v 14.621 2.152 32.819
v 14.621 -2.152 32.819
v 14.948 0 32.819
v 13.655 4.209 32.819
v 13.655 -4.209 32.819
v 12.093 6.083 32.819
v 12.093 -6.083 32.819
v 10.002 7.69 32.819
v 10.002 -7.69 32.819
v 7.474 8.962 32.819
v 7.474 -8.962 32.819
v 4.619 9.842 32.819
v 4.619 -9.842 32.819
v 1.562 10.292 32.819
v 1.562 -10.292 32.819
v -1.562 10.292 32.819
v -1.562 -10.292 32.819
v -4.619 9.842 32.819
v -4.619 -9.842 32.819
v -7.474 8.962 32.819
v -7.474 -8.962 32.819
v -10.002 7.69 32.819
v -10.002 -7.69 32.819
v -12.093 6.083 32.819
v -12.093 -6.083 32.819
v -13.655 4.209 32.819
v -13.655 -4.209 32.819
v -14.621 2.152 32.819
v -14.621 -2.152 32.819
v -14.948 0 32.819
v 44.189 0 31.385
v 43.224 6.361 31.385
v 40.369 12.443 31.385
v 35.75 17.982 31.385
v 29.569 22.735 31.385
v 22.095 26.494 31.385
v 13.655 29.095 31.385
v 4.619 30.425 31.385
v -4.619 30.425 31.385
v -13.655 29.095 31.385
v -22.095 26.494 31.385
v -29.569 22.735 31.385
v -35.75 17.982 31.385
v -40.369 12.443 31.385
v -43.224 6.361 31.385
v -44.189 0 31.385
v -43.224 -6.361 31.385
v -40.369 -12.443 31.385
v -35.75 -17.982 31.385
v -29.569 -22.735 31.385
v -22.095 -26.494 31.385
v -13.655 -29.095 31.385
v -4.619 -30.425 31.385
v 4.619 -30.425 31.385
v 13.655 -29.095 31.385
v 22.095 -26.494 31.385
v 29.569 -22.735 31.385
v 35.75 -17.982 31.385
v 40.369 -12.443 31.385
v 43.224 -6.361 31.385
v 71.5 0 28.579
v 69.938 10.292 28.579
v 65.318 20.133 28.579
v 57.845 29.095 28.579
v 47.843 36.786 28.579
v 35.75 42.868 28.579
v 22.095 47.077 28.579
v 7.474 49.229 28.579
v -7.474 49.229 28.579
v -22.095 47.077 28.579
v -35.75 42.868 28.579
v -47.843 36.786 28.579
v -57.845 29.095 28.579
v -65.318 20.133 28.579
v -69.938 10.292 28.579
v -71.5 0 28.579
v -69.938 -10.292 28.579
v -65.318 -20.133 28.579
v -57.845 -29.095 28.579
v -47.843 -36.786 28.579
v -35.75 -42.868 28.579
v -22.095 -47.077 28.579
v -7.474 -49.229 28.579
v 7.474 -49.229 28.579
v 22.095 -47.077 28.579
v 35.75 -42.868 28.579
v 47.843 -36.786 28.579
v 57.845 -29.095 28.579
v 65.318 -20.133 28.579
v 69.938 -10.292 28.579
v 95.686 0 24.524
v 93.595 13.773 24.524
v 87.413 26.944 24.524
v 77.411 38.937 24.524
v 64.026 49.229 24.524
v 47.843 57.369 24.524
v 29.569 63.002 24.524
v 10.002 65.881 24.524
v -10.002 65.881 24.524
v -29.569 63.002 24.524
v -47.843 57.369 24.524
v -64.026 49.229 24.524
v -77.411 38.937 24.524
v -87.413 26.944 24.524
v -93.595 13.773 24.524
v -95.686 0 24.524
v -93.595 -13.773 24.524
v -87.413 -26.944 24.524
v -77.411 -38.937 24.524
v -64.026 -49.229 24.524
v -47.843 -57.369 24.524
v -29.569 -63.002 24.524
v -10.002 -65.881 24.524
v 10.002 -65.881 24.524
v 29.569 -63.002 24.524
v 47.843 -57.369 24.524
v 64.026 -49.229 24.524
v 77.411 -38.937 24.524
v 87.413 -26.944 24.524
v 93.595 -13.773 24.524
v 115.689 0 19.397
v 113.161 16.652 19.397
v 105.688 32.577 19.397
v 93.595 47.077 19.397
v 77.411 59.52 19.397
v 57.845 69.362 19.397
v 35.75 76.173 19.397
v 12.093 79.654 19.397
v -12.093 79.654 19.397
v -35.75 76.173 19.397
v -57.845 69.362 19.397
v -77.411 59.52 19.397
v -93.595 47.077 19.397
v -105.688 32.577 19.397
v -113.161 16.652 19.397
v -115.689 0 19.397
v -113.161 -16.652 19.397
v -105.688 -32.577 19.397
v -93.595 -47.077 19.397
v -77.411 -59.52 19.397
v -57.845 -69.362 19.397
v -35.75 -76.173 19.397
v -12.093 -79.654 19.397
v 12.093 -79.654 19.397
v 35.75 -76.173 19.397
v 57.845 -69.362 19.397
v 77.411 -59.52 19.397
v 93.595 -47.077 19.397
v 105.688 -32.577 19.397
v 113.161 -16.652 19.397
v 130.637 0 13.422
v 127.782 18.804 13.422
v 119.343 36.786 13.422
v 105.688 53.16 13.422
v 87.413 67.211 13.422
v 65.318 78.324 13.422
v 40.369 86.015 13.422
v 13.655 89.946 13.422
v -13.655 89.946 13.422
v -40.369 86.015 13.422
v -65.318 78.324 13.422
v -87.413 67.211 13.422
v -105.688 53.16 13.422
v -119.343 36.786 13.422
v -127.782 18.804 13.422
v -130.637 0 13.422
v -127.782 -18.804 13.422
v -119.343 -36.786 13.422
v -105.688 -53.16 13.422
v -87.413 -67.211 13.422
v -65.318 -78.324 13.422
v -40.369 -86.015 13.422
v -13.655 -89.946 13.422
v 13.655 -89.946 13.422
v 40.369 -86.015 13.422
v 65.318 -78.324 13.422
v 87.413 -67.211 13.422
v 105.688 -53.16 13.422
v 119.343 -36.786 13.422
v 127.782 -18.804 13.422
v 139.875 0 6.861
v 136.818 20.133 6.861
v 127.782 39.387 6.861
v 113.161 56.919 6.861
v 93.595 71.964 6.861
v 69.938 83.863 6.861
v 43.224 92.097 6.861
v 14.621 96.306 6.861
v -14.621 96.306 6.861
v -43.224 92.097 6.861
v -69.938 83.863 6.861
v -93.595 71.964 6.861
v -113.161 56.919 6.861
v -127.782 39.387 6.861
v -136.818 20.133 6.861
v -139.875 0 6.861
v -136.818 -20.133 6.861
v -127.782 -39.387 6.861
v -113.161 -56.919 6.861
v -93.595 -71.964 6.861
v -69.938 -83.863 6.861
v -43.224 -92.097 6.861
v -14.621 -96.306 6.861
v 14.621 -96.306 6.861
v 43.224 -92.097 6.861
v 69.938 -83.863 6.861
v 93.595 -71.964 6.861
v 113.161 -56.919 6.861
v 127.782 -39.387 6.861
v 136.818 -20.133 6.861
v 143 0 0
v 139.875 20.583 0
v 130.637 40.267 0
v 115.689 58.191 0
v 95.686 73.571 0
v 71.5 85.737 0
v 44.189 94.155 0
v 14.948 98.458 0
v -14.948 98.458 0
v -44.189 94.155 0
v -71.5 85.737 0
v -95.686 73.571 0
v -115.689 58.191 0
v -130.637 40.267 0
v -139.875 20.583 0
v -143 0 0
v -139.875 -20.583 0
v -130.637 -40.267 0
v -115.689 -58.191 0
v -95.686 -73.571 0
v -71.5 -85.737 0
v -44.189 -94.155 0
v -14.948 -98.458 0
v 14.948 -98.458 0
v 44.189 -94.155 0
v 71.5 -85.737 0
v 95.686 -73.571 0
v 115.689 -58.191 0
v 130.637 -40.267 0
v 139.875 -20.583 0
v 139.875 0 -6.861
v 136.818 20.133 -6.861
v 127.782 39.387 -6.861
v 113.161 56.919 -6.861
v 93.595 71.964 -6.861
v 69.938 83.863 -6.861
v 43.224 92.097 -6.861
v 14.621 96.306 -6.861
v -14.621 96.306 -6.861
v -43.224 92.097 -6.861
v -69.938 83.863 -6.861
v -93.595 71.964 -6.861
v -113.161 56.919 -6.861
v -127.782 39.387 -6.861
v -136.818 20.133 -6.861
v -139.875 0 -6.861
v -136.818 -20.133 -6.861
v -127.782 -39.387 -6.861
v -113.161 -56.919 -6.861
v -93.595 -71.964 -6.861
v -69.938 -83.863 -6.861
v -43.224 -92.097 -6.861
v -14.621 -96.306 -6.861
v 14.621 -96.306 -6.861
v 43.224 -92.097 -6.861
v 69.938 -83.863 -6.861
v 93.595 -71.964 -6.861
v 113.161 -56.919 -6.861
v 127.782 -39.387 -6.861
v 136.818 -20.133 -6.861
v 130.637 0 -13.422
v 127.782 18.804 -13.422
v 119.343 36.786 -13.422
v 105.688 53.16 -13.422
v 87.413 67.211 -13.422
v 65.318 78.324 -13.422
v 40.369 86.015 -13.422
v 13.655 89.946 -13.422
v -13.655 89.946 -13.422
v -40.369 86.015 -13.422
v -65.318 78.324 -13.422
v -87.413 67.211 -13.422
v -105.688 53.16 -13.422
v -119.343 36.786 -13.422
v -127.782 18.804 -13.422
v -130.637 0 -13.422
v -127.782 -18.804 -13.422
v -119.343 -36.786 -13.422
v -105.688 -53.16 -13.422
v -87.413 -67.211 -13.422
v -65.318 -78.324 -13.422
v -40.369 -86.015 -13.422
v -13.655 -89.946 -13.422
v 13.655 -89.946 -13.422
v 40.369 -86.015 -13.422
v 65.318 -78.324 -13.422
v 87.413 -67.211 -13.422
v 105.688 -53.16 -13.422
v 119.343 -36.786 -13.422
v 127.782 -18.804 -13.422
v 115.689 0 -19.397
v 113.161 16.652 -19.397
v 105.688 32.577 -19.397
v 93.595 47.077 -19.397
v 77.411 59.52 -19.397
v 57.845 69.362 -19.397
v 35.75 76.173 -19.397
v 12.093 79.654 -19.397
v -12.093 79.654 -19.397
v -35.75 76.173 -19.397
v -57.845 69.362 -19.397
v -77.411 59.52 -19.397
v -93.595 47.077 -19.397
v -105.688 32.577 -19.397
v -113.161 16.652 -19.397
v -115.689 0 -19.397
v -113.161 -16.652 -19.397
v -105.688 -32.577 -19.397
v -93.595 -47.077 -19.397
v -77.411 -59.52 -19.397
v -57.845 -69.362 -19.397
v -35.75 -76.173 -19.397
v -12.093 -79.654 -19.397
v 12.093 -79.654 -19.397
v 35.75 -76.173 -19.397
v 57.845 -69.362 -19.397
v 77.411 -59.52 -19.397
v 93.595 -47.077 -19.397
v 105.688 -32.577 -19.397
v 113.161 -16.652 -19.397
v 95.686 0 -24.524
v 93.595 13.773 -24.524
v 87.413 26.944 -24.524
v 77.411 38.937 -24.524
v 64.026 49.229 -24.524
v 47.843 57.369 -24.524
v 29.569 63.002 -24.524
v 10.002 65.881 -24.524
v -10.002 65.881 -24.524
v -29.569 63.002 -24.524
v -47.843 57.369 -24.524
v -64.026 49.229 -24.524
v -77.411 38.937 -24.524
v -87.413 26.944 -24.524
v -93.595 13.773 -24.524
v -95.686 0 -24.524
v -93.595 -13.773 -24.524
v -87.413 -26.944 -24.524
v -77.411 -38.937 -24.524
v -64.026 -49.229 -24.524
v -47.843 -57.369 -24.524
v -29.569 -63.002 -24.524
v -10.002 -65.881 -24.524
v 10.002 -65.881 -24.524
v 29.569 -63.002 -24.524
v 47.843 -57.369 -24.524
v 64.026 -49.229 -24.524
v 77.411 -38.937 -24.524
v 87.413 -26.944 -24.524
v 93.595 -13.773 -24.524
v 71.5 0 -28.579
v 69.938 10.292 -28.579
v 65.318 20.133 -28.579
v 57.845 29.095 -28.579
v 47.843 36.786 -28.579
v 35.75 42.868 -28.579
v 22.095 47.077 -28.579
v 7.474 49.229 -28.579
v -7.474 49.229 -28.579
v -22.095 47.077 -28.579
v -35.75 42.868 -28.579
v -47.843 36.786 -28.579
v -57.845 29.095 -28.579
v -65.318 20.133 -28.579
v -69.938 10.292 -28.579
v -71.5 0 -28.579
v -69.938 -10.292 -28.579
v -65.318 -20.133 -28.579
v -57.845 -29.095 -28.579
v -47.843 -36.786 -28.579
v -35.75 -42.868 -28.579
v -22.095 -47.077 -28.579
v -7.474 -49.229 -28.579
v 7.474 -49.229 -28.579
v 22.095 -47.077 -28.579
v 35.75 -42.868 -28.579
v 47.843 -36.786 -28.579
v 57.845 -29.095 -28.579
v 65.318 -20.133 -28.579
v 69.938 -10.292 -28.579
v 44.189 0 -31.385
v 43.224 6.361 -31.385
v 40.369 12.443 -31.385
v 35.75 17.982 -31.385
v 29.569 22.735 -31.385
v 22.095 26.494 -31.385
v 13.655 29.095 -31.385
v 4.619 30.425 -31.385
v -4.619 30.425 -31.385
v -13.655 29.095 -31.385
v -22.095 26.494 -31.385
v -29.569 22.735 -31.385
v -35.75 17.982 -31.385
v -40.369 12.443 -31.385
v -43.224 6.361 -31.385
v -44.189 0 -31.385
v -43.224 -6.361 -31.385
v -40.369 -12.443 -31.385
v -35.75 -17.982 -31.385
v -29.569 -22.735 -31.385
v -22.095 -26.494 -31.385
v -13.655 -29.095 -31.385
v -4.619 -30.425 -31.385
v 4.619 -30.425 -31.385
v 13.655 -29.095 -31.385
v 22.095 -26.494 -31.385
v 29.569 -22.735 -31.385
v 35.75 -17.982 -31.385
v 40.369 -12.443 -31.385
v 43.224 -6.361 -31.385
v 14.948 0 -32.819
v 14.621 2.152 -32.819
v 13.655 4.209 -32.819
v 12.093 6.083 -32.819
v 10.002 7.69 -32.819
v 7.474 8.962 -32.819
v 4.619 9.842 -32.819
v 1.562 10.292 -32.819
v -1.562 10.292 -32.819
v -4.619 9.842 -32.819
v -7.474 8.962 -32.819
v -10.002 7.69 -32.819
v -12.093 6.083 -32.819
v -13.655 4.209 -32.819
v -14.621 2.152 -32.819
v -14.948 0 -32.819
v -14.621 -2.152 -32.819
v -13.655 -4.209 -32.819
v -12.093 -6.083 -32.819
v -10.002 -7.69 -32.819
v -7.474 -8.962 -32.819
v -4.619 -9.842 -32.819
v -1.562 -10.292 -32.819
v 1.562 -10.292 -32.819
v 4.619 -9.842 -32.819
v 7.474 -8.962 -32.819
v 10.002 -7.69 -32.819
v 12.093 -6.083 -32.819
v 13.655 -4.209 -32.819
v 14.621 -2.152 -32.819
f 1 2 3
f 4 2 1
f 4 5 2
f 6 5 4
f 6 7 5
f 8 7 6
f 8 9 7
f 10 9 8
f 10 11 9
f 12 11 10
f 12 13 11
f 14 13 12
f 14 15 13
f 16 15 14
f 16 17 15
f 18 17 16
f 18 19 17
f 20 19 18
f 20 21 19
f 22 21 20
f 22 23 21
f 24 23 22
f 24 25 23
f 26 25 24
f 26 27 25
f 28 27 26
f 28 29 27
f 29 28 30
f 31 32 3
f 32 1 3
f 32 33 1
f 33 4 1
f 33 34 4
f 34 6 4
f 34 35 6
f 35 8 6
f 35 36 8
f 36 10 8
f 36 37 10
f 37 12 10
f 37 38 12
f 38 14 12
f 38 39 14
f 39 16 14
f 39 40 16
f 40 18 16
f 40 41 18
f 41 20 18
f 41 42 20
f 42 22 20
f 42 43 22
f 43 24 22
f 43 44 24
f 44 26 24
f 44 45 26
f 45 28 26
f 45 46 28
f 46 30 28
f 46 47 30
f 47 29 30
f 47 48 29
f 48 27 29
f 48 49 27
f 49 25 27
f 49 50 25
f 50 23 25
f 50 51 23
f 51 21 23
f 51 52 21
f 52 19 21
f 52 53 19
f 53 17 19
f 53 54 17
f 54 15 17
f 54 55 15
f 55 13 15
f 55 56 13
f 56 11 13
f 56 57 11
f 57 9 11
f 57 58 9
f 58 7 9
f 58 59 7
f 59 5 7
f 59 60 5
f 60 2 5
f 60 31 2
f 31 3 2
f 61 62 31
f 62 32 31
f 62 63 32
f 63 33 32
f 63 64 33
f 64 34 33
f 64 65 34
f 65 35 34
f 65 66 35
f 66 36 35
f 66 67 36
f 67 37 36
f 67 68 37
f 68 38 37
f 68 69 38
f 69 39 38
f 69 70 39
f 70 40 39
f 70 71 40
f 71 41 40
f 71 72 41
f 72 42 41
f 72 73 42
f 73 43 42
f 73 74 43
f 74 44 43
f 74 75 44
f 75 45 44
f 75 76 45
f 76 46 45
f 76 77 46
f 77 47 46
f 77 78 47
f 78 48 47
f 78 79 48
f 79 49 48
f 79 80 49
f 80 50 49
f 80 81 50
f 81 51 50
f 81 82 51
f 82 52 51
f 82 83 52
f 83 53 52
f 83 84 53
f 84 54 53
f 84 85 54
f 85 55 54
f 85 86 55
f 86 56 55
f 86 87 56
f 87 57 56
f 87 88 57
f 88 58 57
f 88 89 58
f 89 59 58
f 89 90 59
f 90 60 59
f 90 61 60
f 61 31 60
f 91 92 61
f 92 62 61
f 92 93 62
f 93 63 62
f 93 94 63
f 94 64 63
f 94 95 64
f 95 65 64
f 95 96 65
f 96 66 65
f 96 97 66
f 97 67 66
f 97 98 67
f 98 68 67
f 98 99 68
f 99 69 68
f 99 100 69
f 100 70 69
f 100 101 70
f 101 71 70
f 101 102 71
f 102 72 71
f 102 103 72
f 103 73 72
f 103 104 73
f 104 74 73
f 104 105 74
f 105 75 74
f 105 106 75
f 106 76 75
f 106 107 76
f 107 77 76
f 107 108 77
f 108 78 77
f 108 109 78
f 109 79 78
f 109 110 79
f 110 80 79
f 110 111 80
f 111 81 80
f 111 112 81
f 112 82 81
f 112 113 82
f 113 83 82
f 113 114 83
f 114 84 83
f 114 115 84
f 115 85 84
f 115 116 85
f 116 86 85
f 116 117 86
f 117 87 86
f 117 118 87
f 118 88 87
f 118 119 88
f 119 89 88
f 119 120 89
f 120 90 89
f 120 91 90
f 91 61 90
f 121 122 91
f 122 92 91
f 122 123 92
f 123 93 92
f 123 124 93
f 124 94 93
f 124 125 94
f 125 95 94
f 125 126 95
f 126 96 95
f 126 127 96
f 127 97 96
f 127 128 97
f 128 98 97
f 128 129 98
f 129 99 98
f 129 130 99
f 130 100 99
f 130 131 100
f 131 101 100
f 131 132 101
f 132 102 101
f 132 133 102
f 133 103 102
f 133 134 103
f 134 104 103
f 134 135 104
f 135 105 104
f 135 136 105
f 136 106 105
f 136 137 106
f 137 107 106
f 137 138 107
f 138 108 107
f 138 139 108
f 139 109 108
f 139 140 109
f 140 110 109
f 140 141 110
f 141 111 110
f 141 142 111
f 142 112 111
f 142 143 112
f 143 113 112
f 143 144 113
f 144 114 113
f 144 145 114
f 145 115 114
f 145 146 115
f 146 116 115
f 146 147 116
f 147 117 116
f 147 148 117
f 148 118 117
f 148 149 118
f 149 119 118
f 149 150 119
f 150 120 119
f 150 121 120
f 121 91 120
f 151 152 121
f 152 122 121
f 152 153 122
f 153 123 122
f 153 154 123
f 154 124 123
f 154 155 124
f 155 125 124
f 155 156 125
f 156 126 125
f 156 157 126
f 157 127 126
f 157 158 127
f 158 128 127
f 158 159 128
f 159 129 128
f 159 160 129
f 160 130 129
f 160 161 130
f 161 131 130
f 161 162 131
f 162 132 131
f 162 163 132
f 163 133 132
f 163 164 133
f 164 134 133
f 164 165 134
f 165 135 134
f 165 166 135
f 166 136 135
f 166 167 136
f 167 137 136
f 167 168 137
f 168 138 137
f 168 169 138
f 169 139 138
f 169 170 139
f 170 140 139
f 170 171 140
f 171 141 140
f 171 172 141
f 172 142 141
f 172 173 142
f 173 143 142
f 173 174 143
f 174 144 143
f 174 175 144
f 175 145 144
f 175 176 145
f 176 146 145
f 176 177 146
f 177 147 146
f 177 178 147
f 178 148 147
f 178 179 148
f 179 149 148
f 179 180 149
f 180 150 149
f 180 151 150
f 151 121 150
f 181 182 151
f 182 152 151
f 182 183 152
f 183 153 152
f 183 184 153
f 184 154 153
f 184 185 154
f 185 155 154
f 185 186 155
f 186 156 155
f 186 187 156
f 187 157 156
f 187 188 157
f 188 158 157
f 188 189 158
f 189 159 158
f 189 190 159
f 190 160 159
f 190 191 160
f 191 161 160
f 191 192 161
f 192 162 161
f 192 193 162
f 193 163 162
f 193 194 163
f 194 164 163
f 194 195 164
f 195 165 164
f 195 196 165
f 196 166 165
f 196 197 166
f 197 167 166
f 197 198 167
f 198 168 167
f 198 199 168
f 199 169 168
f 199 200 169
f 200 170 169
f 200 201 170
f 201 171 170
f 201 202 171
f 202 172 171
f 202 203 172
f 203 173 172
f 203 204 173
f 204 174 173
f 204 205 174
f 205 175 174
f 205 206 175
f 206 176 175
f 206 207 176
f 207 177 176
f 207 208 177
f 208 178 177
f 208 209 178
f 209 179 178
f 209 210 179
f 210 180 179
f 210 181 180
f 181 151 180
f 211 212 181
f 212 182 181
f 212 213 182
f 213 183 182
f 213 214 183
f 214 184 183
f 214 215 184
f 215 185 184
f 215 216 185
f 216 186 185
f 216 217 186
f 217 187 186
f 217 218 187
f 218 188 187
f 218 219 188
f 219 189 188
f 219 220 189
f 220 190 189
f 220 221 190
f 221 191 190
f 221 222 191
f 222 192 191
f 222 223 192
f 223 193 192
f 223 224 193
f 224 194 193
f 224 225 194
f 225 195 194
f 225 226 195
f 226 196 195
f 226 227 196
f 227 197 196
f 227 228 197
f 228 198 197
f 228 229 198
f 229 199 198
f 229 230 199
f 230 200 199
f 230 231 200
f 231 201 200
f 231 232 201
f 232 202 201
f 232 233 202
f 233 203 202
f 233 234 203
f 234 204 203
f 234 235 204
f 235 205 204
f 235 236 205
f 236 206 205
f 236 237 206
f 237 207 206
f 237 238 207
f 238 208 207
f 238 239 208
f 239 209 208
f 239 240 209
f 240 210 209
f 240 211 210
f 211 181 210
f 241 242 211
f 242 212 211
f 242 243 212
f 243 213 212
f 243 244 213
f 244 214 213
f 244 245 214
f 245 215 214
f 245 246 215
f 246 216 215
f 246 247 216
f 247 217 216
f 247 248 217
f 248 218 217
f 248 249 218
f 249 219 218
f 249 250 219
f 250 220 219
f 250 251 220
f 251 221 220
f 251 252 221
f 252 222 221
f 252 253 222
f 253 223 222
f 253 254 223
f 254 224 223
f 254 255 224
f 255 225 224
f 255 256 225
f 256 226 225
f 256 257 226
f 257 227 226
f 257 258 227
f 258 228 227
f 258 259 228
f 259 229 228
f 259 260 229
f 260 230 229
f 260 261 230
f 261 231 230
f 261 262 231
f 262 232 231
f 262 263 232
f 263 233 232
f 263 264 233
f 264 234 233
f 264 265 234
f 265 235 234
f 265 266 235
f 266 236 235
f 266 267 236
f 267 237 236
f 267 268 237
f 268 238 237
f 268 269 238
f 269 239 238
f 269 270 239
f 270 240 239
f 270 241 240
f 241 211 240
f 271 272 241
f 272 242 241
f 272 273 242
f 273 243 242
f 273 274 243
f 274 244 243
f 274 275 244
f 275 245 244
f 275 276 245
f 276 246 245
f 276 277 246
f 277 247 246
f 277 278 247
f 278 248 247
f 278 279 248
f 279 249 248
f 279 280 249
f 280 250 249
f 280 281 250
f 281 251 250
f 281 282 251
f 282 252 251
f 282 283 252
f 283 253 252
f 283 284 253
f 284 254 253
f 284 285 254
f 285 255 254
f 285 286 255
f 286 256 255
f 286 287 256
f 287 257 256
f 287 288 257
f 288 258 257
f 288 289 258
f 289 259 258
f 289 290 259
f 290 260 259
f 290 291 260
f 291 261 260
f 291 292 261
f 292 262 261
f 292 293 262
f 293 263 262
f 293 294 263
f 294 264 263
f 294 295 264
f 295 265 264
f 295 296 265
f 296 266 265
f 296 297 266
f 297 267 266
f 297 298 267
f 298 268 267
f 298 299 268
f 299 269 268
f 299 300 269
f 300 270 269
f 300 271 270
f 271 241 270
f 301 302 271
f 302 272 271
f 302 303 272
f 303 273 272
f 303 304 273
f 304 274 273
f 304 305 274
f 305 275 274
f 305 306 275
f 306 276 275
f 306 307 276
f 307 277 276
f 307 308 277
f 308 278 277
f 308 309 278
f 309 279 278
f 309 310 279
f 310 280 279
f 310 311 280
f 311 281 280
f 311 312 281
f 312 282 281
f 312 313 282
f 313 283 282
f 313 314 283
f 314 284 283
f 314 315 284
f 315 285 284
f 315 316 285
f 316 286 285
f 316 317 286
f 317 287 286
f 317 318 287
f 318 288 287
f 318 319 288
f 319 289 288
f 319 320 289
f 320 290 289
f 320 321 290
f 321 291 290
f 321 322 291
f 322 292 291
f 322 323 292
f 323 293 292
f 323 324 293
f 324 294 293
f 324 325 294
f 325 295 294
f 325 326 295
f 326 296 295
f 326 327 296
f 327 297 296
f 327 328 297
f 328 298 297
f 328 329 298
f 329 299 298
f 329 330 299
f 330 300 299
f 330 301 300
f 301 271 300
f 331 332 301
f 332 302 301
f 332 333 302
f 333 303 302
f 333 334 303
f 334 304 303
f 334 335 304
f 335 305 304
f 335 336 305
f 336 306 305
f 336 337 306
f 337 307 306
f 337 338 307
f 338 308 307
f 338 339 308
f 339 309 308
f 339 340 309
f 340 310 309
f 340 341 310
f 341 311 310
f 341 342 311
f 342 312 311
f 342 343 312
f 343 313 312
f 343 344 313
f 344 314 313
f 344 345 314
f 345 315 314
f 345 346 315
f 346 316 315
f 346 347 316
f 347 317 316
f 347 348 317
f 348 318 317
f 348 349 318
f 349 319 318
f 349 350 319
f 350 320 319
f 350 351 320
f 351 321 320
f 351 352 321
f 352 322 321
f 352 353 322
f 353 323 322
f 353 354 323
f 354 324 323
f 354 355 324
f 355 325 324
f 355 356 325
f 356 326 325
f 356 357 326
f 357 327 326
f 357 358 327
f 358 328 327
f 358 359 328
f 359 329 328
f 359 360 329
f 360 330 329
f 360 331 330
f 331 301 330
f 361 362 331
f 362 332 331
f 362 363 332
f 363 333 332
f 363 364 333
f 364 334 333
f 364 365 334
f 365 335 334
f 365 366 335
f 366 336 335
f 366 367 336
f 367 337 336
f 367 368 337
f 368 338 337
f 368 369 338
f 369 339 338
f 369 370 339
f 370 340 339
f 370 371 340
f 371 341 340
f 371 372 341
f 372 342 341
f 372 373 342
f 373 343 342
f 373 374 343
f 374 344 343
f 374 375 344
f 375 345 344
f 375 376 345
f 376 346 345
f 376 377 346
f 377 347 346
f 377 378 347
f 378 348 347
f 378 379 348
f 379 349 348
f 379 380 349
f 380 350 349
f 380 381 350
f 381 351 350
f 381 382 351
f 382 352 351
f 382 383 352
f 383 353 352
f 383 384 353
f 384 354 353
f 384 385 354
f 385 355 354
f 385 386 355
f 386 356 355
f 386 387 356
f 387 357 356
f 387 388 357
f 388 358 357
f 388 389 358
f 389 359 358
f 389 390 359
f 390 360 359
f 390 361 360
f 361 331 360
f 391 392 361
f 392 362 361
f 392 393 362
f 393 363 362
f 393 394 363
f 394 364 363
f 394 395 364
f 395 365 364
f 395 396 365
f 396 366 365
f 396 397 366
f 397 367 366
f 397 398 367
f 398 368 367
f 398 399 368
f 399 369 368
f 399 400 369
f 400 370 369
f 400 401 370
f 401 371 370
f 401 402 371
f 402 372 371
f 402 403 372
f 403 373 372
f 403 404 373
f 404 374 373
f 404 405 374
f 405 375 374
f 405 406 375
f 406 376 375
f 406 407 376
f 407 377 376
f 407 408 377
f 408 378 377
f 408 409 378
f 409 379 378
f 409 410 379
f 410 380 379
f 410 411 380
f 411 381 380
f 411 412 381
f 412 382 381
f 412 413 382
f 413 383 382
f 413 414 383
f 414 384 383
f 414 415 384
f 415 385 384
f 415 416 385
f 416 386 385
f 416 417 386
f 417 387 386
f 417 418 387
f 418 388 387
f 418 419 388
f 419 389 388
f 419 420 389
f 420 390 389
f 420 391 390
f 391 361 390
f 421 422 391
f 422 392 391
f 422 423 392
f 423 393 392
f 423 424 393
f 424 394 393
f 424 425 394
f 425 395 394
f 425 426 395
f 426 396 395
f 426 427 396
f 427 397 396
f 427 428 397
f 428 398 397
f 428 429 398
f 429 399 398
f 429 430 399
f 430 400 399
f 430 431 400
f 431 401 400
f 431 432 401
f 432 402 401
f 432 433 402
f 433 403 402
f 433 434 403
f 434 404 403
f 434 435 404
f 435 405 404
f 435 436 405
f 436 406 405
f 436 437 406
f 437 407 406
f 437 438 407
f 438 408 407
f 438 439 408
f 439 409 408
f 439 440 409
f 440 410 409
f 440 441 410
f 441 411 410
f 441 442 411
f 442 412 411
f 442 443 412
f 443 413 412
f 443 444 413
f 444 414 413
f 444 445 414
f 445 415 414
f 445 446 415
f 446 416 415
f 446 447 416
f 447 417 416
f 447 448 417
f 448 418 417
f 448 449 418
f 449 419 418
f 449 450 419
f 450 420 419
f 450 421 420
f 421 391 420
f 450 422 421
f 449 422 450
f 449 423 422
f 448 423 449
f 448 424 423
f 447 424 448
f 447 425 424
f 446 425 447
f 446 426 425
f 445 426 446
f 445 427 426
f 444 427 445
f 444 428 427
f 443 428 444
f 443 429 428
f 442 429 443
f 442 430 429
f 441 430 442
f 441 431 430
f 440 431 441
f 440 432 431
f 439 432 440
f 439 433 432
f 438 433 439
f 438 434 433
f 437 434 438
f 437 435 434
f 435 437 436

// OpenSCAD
// Generated by SolidPython 1.0.1 on 2020-07-29 00:46:50


scale(v = [13, 9, 3]) {
	sphere(r = 11);
}
/***********************************************
*********      SolidPython code:      **********
************************************************
 
# import packages: SolidPython
from solid import *
from solid.utils import *
from itertools import chain, combinations, permutations


class Resize:

    def __init__(self, scad_file):
        self.scad_file = scad_file
        #self.scad_file = import_scad(scad_file)
        # cone/cylinder param:
        self.r1 = 0
        self.r2 = 0
        self.h = 0
        # rectangular prism param:
        self.w = 0
        self.l = 0
        # ellipse param:
        self.r = 0

    # import OpenScad code (file name corresponds to shape)


    # classify shape + parameters
    def assign(self, param1, param2, param3):
        if self.scad_file == 'cone.scad':
            self.r1 = param1
            self.r2 = param2
            self.h = param3
        elif self.scad_file == 'cylinder.scad':
            self.r1 = param1
            self.r2 = param2
            self.h = param3
        elif self.scad_file == 'rectangularPrism.scad':
            self.h = param1
            self.l = param2
            self.w = param3
        else:
            self.r = param1
            self.h = param2

    # resize parameters
    def iterate(self):
        x = range(3, 20, 2)
        i = 1
        if self.scad_file == 'cone.scad':
            tempList = list(permutations(x, 2))
            for temp in tempList:
                param1 = temp[0]
                param2 = temp[1]
                filepath = 'produced_scad_files/' + 'cone' + str(param1) + '_' + str(param2) + '_' + '.scad'
                scad_render_to_file(cylinder(h=param1, r1=param2, r2=0), filepath)

        elif self.scad_file == 'cylinder.scad':
            tempList = list(permutations(x, 3))
            for temp in tempList:
                param1 = temp[0]
                param2 = temp[1]
                filepath = 'produced_scad_files/' + 'cylinder' + str(param1) + '_' + str(param2) + '_' + '.scad'
                scad_render_to_file(cylinder(h=param1, r1=param2, r2=param2), filepath)

        elif self.scad_file == 'rectangularPrism.scad':
            tempList = list(permutations(x, 3))
            for temp in tempList:
                param1 = temp[0]
                param2 = temp[1]
                param3 = temp[2]
                filepath = 'produced_scad_files/' + 'rectangularPrism' + str(param1) + '_' + str(param2) + '_' + str(
                    param3) + '.scad'
                scad_render_to_file(cube(size=(param1, param2, param3)), filepath)

        elif self.scad_file == 'ellipse.scad':
            tempList = list(permutations(x, 4))
            for temp in tempList:
                param1 = temp[0]
                param2 = temp[1]
                param3 = temp[2]
                param4 = temp[3]
                filepath = 'produced_scad_files/' + 'ellipse' + str(param1) + '_' + str(param2) + '_' + str(param3) + '_' + str(param4) + '.scad'
                scad_render_to_file(scale([param1, param2, param3])(sphere(r=param4)), filepath)

    def render_to_scadfile(self):
        scad_render_to_file(scad, 'example.scad') 
 
************************************************/
